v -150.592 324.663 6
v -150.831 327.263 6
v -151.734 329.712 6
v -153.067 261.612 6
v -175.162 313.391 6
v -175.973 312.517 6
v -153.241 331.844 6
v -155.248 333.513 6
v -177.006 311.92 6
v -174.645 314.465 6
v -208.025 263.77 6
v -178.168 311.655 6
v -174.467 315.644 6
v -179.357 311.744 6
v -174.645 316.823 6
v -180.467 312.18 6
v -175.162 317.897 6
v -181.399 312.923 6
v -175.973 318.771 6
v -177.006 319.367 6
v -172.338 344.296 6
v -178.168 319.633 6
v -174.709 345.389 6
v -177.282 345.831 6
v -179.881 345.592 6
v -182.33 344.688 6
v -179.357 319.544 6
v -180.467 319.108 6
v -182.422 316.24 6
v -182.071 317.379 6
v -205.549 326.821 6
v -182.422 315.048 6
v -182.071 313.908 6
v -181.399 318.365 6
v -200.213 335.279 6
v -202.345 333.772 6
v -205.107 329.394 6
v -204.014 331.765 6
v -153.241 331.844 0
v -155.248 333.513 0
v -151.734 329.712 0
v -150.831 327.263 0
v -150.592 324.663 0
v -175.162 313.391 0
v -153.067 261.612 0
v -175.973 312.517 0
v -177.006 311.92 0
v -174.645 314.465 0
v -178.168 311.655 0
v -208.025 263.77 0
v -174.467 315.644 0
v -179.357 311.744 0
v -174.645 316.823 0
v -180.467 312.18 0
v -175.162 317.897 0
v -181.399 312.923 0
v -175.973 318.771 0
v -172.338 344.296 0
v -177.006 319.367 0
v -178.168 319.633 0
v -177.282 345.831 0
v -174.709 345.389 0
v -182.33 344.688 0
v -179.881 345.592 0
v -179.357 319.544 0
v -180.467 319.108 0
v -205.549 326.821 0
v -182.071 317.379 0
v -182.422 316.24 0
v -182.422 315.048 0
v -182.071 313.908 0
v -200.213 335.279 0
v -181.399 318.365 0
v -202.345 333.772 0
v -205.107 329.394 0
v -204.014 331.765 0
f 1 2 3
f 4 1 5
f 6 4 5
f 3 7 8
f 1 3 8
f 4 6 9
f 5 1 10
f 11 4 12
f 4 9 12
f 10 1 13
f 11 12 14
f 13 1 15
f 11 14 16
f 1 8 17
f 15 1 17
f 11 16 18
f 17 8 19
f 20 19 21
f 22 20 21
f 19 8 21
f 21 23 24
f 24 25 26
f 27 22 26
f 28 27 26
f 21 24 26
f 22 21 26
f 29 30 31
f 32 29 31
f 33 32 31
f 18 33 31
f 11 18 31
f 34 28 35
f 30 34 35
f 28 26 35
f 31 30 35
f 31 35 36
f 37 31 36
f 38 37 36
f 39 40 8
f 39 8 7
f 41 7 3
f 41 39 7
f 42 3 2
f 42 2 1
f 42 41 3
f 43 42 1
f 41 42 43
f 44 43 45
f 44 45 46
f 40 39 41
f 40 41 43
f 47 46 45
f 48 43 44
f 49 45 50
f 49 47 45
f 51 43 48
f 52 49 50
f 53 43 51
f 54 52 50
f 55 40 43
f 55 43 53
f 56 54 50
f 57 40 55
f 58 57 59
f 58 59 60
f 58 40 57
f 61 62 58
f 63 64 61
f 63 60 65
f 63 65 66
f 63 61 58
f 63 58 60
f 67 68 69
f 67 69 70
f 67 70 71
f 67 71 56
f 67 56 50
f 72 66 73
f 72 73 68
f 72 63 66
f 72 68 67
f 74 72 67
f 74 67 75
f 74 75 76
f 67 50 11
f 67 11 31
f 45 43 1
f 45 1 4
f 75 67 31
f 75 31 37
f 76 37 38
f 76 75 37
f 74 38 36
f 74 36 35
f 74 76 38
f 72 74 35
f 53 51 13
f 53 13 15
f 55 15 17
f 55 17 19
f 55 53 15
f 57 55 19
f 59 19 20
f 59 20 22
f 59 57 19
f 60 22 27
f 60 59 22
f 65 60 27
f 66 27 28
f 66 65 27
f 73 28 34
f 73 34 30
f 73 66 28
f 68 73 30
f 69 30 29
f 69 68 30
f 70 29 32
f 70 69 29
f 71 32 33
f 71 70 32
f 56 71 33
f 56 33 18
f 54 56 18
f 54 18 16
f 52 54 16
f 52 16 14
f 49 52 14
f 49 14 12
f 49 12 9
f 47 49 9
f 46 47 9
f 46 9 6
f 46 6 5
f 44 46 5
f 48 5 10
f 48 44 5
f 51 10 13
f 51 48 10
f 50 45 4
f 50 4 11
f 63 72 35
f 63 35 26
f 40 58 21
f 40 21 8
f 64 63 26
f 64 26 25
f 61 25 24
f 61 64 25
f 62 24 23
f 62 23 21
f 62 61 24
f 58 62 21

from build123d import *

# Parameters (mm, degrees)
SKETCH1_R           = 4
BOSS_EXTRUDE1_DEPTH = 6


with BuildPart() as part:
    # Sketch1 → Boss-Extrude1 (new body)
    with BuildSketch(Plane.XY):
        with BuildLine():
            Line((-200.213397345, 335.278845102), (-182.330447011, 344.688065085))
            ThreePointArc((-182.330447011, 344.688065085), (-177.281730902, 345.830599505), (-172.338147286, 344.295705283))
            Line((-172.338147286, 344.295705283), (-155.248048584, 333.513225991))
            ThreePointArc((-155.248048584, 333.513225991), (-151.734226698, 329.712176794), (-150.591692278, 324.663460686))
            Line((-150.591692278, 324.663460686), (-153.067482632, 261.612049424))
            Line((-153.067482632, 261.612049424), (-208.025131117, 263.770028338))
            Line((-208.025131117, 263.770028338), (-205.549340763, 326.8214396))
            ThreePointArc((-205.549340763, 326.8214396), (-204.014446541, 331.765023216), (-200.213397345, 335.278845102))
        make_face()
        with Locations((-178.467049866, 315.643862037)):
            Circle(SKETCH1_R, mode=Mode.SUBTRACT)
    extrude(amount=BOSS_EXTRUDE1_DEPTH)


solid = part.part
